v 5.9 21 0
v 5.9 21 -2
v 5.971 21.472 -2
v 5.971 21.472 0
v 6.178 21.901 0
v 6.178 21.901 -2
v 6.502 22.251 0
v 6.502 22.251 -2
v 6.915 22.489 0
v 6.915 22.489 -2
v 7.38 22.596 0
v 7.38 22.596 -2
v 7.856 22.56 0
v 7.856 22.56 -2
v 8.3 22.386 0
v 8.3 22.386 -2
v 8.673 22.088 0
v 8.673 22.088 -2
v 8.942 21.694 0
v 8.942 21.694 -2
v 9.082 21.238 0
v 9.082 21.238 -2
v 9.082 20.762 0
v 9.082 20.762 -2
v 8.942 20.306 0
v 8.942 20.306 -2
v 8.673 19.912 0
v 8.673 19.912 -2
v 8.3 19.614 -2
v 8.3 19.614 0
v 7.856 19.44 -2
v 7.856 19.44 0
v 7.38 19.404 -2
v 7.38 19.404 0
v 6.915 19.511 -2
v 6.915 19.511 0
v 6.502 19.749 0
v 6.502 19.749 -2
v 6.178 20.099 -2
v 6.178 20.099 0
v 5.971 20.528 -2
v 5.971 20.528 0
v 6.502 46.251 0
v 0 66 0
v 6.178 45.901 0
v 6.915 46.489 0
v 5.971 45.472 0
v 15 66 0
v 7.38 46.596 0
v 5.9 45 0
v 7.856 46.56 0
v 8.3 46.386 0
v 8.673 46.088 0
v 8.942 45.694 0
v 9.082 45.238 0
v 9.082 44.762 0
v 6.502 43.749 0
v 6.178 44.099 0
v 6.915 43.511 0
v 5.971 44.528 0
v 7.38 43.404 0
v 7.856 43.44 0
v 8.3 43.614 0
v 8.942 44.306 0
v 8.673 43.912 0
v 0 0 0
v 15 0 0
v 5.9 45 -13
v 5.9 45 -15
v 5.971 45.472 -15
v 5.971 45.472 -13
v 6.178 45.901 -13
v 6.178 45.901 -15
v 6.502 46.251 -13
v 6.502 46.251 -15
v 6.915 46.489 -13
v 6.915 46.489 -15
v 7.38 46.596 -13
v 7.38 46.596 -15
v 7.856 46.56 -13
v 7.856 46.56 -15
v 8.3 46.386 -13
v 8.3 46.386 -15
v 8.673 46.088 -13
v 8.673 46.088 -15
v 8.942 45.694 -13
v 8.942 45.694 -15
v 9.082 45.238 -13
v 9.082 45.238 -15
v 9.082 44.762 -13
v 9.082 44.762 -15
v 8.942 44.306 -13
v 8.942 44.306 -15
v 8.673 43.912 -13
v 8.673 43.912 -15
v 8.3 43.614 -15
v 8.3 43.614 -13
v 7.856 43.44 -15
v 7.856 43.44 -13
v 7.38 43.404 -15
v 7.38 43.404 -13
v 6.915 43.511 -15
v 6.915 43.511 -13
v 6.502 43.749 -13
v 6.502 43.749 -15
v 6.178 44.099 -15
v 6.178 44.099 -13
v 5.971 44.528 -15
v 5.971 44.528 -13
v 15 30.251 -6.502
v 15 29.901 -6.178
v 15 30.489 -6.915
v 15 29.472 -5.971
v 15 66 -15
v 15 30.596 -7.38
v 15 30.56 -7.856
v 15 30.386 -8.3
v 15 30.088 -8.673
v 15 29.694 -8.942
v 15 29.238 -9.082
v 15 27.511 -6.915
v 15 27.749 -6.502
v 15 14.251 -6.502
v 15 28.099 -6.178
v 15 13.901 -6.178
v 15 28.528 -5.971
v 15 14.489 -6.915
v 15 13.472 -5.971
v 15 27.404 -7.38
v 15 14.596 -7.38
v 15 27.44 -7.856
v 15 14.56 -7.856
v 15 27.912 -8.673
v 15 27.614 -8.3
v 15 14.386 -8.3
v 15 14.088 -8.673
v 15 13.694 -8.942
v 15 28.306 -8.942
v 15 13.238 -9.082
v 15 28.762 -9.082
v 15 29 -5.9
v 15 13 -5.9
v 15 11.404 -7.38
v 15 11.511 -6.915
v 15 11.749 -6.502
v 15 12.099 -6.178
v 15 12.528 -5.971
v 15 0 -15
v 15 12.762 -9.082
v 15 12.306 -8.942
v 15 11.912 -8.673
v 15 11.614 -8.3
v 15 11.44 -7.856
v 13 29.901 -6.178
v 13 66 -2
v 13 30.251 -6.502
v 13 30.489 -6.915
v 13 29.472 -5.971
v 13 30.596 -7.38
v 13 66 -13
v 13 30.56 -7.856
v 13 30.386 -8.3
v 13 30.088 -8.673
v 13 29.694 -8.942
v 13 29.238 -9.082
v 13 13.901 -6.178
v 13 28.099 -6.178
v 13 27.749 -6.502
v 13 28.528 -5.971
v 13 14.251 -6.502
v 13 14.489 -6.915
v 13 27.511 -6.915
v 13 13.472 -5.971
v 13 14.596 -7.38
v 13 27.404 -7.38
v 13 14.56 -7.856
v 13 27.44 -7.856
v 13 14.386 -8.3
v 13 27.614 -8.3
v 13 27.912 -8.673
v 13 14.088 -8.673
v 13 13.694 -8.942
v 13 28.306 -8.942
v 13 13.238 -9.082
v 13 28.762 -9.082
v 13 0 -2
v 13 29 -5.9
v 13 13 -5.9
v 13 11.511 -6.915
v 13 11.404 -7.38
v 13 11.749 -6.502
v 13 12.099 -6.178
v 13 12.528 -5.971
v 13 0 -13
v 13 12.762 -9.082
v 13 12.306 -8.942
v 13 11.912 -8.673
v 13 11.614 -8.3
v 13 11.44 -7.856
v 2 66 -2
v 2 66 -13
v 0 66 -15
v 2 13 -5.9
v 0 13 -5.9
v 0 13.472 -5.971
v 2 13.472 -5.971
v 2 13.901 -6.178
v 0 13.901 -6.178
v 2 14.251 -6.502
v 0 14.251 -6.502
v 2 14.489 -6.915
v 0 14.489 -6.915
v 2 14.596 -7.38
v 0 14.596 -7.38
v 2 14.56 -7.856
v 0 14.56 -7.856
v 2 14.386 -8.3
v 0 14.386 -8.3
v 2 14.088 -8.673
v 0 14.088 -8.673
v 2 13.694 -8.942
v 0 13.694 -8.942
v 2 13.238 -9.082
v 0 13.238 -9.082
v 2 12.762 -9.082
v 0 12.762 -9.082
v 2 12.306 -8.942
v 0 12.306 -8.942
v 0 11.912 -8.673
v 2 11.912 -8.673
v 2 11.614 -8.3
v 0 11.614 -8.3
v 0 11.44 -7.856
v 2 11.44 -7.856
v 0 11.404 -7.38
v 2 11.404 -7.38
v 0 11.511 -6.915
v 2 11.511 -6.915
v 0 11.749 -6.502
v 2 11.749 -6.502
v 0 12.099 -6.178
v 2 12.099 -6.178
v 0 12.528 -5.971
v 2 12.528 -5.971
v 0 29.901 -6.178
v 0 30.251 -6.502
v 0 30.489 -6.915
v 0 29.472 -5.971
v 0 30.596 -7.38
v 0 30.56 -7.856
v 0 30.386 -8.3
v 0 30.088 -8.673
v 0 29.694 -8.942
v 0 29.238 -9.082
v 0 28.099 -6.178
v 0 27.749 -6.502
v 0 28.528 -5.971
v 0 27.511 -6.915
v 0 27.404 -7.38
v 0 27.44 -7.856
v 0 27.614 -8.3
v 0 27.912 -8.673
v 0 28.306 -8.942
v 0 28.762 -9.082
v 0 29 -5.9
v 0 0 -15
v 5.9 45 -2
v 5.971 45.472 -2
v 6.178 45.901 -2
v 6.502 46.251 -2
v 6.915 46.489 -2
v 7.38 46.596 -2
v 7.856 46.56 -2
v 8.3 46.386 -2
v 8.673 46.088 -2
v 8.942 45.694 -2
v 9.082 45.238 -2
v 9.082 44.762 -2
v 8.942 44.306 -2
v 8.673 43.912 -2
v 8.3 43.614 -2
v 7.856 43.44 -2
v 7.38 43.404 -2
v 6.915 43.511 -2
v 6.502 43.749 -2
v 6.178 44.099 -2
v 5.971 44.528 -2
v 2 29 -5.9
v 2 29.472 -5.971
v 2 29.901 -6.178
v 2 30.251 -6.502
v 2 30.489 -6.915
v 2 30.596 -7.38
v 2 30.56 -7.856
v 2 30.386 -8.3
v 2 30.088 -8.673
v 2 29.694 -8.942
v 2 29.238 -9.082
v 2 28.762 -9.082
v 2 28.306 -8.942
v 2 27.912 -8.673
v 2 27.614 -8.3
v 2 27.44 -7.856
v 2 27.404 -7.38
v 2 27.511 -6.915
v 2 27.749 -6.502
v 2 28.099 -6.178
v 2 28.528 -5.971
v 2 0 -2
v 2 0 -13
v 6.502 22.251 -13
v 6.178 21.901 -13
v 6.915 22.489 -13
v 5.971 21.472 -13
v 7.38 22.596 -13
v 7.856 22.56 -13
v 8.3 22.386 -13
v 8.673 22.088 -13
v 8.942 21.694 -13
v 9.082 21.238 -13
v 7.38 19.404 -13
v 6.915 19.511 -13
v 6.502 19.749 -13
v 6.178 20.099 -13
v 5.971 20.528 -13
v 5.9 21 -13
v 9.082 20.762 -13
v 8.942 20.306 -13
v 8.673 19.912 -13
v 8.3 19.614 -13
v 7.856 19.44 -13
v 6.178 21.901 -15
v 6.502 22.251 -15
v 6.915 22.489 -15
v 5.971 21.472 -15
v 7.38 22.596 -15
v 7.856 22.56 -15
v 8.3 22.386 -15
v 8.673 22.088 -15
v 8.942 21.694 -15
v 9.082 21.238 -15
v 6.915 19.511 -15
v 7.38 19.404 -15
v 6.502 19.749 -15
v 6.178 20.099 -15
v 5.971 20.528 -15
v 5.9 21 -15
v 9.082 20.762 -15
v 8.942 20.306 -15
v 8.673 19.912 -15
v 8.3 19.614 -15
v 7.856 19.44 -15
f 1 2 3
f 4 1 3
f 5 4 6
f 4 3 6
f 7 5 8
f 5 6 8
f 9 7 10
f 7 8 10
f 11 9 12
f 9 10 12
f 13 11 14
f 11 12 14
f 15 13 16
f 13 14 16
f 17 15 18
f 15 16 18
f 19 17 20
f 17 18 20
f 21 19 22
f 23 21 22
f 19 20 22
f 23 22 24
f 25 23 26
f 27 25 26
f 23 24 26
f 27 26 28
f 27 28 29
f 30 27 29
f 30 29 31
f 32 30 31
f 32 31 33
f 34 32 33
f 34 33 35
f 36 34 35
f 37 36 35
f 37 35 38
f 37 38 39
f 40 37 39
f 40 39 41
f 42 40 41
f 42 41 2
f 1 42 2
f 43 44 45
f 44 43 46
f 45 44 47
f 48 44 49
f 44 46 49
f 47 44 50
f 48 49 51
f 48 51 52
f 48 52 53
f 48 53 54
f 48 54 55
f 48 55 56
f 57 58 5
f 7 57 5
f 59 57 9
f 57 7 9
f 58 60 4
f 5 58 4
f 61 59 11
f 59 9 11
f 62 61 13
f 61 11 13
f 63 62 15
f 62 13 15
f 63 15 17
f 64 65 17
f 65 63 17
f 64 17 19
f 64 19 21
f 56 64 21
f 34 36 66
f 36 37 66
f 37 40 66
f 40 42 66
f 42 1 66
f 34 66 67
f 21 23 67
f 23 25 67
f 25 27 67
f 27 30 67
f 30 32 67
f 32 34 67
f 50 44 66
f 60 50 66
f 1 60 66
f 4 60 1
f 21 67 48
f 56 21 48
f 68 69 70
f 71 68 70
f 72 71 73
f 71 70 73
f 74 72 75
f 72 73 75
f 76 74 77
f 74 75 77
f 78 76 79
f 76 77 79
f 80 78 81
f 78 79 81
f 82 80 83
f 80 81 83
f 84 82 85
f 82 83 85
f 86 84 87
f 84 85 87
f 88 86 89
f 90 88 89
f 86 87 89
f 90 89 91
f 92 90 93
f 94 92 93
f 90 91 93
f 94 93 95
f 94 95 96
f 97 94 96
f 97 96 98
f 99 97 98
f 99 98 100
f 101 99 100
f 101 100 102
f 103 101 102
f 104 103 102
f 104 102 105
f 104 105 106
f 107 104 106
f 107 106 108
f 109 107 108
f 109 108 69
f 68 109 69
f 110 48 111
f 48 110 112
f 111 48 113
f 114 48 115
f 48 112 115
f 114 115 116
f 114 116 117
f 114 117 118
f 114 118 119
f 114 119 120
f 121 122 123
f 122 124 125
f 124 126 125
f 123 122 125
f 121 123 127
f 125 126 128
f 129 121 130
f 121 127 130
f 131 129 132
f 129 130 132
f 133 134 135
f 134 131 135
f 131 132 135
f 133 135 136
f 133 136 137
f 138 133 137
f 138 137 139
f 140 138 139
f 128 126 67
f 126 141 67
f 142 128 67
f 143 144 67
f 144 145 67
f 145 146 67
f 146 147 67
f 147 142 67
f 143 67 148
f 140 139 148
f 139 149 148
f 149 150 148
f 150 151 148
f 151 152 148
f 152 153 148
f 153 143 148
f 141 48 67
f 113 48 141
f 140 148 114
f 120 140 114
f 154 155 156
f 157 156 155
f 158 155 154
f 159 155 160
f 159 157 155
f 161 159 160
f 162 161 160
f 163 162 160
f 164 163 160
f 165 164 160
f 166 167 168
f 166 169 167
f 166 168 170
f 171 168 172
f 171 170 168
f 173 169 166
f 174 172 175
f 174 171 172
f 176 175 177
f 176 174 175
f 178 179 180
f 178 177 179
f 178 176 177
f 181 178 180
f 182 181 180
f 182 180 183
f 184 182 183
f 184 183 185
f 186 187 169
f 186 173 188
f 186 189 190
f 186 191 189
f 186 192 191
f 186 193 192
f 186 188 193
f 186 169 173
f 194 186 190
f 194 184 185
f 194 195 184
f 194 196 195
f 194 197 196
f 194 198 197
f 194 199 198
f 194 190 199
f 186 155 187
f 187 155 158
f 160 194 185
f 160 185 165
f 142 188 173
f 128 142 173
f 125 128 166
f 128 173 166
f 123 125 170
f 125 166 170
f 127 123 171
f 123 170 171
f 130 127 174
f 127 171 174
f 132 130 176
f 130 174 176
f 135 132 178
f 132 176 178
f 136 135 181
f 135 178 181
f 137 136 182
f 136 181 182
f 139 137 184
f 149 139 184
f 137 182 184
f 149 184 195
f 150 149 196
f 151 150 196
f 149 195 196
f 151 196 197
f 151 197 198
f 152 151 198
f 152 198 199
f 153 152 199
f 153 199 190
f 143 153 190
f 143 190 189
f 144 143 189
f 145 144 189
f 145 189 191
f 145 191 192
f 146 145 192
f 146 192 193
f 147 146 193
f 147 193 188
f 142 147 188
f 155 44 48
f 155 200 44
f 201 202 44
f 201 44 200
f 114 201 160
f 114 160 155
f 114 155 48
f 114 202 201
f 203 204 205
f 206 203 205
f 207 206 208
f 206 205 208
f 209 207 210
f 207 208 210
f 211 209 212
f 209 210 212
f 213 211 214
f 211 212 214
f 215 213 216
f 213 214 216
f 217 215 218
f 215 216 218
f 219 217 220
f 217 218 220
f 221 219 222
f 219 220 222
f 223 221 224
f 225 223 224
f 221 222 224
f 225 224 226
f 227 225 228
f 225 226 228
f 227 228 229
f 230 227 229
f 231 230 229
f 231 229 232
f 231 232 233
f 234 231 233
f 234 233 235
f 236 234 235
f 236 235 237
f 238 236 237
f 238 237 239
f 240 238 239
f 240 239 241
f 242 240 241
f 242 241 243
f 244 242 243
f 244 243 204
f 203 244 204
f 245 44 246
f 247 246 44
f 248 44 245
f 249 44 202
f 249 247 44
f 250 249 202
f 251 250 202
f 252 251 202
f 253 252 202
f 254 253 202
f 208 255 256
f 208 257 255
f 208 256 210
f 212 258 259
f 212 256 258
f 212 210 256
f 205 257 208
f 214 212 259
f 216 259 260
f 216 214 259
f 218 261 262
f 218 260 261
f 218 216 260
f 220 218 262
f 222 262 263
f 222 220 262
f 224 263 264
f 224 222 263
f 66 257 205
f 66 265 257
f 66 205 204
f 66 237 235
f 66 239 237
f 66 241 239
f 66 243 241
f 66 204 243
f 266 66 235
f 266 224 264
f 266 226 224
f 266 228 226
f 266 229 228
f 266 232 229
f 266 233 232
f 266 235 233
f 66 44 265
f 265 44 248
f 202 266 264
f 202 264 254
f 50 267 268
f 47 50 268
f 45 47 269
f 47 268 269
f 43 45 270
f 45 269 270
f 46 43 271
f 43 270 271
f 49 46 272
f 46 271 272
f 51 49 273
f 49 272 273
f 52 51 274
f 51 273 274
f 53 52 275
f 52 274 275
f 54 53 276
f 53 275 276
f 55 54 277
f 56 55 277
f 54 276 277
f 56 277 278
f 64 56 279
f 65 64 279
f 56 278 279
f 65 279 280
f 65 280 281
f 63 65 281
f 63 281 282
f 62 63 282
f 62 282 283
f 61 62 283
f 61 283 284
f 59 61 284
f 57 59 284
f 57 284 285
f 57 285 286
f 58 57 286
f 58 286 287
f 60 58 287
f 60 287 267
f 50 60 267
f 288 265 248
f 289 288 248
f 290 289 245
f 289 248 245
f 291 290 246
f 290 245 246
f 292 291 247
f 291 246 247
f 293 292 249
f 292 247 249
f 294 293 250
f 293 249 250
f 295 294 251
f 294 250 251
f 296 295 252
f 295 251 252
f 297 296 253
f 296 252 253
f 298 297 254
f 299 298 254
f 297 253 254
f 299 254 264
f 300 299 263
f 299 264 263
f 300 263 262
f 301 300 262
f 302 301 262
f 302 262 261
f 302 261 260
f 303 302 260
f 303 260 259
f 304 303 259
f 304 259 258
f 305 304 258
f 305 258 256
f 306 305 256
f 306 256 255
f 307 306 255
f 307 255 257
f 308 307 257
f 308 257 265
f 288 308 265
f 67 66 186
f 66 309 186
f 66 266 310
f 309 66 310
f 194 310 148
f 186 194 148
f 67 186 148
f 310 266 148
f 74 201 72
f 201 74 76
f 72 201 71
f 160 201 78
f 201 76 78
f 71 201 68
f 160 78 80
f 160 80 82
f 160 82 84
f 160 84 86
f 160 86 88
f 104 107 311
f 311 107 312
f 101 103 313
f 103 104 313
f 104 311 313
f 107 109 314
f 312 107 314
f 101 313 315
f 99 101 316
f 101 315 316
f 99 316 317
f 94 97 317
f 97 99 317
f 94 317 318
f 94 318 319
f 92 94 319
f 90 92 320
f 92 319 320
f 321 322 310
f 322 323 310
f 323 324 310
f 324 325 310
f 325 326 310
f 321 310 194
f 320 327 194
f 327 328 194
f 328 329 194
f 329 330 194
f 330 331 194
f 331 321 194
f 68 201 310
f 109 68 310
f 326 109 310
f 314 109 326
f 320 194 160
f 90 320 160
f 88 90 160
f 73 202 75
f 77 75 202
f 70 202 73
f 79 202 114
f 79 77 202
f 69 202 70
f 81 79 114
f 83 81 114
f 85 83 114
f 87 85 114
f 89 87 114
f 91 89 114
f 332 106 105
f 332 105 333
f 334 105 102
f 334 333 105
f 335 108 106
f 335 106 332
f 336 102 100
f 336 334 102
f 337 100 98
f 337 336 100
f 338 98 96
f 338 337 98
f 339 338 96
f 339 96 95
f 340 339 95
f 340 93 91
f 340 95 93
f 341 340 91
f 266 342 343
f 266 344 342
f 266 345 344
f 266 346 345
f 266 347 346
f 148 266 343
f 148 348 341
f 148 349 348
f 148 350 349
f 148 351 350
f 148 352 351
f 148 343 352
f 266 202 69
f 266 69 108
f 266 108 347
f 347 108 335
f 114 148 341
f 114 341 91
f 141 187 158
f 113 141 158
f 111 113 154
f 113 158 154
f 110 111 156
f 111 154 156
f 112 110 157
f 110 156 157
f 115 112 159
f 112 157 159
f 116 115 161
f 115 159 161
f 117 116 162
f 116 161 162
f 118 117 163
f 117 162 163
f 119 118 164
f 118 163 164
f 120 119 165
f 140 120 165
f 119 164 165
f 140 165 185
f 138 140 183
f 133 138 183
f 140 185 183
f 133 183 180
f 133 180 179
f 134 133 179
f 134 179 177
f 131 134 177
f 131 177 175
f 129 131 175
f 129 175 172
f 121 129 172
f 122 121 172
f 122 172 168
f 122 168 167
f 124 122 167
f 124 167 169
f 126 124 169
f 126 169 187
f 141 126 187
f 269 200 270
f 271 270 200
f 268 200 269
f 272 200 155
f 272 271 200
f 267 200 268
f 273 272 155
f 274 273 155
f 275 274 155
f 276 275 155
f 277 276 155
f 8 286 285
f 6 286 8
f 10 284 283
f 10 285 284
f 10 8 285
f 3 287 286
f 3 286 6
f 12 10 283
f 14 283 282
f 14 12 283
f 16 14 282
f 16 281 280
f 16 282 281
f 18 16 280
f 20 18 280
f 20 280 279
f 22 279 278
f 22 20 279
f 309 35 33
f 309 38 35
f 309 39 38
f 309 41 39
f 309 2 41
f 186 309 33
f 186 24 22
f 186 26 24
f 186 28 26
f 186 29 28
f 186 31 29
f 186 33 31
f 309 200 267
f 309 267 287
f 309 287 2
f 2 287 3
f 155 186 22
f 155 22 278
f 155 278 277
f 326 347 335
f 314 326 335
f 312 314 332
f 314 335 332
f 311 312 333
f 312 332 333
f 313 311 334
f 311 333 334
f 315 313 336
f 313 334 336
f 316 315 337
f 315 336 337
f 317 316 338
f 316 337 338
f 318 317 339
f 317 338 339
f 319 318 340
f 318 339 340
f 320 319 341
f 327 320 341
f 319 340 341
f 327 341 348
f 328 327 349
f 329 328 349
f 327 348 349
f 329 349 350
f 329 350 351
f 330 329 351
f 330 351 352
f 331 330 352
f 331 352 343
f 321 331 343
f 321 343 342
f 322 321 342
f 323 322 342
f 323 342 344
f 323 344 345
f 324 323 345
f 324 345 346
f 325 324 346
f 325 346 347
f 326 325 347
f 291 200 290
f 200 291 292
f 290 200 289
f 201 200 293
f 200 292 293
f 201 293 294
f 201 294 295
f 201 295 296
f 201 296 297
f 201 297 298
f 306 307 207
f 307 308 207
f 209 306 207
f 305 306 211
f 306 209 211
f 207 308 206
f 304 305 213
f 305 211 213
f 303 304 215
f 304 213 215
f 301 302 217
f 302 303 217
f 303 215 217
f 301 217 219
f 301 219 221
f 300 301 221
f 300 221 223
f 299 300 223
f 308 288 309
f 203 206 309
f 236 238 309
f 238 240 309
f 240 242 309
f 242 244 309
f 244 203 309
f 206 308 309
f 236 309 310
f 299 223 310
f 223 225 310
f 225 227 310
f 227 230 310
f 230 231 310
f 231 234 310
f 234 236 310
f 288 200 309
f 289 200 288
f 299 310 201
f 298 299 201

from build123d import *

# Parameters (mm, degrees)
SKETCH1_W           = 15
SKETCH1_H           = 15
SKETCH1_W_2         = 11
SKETCH1_H_2         = 11
BOSS_EXTRUDE1_DEPTH = 66
SKETCH3_R           = 1.6
CUT_EXTRUDE1_DEPTH  = 70.32532005
SKETCH4_R           = 1.6
CUT_EXTRUDE2_DEPTH  = 70.32532005


with BuildPart() as part:
    # Sketch1 → Boss-Extrude1 (new body)
    with BuildSketch(Plane(origin=(0, 0, 0), x_dir=(1, 0, 0), z_dir=(0, 1, 0))):
        with Locations((7.5, 7.5)):
            Rectangle(SKETCH1_W, SKETCH1_H)
        with Locations((7.5, 7.5)):
            Rectangle(SKETCH1_W_2, SKETCH1_H_2, mode=Mode.SUBTRACT)
    extrude(amount=BOSS_EXTRUDE1_DEPTH)

    # Sketch3 → Cut-Extrude1 (cut, through all)
    with BuildSketch(Plane(origin=(0, 0, -15), x_dir=(-1, 0, 0), z_dir=(0, 0, -1))):
        with Locations((-7.5, 21)):
            Circle(SKETCH3_R)
        with Locations((-7.5, 45)):
            Circle(SKETCH3_R)
    extrude(amount=-CUT_EXTRUDE1_DEPTH, mode=Mode.SUBTRACT)

    # Sketch4 → Cut-Extrude2 (cut, through all)
    with BuildSketch(Plane.ZY):
        with Locations((-7.5, 13)):
            Circle(SKETCH4_R)
        with Locations((-7.5, 29)):
            Circle(SKETCH4_R)
    extrude(amount=-CUT_EXTRUDE2_DEPTH, mode=Mode.SUBTRACT)


solid = part.part
